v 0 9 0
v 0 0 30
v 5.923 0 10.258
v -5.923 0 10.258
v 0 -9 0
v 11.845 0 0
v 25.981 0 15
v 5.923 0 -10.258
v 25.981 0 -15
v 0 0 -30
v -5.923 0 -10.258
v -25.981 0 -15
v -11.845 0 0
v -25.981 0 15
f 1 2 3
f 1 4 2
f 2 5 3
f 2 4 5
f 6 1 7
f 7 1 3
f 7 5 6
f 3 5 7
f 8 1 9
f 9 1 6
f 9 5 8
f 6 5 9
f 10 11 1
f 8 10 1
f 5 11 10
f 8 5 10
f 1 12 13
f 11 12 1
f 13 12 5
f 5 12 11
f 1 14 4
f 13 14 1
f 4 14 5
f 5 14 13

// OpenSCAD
// lock view to center
// $vpt = [0,0,0];

// edges on the star
ticks = 6;

// how long the edges should be (in mm)
size = 30;

// how thick and wide the ticks should be
thickness = 0.3;
wideness = 0.3;

for ( i = [ 0 : ticks ] ){
    rotate( 360 / ticks * i, [ 0, 1, 0 ] )
    scale( [ wideness, thickness, 1 ] )
	color("gold")
    cylinder( size, size, 0, $fn = 4 );
}
